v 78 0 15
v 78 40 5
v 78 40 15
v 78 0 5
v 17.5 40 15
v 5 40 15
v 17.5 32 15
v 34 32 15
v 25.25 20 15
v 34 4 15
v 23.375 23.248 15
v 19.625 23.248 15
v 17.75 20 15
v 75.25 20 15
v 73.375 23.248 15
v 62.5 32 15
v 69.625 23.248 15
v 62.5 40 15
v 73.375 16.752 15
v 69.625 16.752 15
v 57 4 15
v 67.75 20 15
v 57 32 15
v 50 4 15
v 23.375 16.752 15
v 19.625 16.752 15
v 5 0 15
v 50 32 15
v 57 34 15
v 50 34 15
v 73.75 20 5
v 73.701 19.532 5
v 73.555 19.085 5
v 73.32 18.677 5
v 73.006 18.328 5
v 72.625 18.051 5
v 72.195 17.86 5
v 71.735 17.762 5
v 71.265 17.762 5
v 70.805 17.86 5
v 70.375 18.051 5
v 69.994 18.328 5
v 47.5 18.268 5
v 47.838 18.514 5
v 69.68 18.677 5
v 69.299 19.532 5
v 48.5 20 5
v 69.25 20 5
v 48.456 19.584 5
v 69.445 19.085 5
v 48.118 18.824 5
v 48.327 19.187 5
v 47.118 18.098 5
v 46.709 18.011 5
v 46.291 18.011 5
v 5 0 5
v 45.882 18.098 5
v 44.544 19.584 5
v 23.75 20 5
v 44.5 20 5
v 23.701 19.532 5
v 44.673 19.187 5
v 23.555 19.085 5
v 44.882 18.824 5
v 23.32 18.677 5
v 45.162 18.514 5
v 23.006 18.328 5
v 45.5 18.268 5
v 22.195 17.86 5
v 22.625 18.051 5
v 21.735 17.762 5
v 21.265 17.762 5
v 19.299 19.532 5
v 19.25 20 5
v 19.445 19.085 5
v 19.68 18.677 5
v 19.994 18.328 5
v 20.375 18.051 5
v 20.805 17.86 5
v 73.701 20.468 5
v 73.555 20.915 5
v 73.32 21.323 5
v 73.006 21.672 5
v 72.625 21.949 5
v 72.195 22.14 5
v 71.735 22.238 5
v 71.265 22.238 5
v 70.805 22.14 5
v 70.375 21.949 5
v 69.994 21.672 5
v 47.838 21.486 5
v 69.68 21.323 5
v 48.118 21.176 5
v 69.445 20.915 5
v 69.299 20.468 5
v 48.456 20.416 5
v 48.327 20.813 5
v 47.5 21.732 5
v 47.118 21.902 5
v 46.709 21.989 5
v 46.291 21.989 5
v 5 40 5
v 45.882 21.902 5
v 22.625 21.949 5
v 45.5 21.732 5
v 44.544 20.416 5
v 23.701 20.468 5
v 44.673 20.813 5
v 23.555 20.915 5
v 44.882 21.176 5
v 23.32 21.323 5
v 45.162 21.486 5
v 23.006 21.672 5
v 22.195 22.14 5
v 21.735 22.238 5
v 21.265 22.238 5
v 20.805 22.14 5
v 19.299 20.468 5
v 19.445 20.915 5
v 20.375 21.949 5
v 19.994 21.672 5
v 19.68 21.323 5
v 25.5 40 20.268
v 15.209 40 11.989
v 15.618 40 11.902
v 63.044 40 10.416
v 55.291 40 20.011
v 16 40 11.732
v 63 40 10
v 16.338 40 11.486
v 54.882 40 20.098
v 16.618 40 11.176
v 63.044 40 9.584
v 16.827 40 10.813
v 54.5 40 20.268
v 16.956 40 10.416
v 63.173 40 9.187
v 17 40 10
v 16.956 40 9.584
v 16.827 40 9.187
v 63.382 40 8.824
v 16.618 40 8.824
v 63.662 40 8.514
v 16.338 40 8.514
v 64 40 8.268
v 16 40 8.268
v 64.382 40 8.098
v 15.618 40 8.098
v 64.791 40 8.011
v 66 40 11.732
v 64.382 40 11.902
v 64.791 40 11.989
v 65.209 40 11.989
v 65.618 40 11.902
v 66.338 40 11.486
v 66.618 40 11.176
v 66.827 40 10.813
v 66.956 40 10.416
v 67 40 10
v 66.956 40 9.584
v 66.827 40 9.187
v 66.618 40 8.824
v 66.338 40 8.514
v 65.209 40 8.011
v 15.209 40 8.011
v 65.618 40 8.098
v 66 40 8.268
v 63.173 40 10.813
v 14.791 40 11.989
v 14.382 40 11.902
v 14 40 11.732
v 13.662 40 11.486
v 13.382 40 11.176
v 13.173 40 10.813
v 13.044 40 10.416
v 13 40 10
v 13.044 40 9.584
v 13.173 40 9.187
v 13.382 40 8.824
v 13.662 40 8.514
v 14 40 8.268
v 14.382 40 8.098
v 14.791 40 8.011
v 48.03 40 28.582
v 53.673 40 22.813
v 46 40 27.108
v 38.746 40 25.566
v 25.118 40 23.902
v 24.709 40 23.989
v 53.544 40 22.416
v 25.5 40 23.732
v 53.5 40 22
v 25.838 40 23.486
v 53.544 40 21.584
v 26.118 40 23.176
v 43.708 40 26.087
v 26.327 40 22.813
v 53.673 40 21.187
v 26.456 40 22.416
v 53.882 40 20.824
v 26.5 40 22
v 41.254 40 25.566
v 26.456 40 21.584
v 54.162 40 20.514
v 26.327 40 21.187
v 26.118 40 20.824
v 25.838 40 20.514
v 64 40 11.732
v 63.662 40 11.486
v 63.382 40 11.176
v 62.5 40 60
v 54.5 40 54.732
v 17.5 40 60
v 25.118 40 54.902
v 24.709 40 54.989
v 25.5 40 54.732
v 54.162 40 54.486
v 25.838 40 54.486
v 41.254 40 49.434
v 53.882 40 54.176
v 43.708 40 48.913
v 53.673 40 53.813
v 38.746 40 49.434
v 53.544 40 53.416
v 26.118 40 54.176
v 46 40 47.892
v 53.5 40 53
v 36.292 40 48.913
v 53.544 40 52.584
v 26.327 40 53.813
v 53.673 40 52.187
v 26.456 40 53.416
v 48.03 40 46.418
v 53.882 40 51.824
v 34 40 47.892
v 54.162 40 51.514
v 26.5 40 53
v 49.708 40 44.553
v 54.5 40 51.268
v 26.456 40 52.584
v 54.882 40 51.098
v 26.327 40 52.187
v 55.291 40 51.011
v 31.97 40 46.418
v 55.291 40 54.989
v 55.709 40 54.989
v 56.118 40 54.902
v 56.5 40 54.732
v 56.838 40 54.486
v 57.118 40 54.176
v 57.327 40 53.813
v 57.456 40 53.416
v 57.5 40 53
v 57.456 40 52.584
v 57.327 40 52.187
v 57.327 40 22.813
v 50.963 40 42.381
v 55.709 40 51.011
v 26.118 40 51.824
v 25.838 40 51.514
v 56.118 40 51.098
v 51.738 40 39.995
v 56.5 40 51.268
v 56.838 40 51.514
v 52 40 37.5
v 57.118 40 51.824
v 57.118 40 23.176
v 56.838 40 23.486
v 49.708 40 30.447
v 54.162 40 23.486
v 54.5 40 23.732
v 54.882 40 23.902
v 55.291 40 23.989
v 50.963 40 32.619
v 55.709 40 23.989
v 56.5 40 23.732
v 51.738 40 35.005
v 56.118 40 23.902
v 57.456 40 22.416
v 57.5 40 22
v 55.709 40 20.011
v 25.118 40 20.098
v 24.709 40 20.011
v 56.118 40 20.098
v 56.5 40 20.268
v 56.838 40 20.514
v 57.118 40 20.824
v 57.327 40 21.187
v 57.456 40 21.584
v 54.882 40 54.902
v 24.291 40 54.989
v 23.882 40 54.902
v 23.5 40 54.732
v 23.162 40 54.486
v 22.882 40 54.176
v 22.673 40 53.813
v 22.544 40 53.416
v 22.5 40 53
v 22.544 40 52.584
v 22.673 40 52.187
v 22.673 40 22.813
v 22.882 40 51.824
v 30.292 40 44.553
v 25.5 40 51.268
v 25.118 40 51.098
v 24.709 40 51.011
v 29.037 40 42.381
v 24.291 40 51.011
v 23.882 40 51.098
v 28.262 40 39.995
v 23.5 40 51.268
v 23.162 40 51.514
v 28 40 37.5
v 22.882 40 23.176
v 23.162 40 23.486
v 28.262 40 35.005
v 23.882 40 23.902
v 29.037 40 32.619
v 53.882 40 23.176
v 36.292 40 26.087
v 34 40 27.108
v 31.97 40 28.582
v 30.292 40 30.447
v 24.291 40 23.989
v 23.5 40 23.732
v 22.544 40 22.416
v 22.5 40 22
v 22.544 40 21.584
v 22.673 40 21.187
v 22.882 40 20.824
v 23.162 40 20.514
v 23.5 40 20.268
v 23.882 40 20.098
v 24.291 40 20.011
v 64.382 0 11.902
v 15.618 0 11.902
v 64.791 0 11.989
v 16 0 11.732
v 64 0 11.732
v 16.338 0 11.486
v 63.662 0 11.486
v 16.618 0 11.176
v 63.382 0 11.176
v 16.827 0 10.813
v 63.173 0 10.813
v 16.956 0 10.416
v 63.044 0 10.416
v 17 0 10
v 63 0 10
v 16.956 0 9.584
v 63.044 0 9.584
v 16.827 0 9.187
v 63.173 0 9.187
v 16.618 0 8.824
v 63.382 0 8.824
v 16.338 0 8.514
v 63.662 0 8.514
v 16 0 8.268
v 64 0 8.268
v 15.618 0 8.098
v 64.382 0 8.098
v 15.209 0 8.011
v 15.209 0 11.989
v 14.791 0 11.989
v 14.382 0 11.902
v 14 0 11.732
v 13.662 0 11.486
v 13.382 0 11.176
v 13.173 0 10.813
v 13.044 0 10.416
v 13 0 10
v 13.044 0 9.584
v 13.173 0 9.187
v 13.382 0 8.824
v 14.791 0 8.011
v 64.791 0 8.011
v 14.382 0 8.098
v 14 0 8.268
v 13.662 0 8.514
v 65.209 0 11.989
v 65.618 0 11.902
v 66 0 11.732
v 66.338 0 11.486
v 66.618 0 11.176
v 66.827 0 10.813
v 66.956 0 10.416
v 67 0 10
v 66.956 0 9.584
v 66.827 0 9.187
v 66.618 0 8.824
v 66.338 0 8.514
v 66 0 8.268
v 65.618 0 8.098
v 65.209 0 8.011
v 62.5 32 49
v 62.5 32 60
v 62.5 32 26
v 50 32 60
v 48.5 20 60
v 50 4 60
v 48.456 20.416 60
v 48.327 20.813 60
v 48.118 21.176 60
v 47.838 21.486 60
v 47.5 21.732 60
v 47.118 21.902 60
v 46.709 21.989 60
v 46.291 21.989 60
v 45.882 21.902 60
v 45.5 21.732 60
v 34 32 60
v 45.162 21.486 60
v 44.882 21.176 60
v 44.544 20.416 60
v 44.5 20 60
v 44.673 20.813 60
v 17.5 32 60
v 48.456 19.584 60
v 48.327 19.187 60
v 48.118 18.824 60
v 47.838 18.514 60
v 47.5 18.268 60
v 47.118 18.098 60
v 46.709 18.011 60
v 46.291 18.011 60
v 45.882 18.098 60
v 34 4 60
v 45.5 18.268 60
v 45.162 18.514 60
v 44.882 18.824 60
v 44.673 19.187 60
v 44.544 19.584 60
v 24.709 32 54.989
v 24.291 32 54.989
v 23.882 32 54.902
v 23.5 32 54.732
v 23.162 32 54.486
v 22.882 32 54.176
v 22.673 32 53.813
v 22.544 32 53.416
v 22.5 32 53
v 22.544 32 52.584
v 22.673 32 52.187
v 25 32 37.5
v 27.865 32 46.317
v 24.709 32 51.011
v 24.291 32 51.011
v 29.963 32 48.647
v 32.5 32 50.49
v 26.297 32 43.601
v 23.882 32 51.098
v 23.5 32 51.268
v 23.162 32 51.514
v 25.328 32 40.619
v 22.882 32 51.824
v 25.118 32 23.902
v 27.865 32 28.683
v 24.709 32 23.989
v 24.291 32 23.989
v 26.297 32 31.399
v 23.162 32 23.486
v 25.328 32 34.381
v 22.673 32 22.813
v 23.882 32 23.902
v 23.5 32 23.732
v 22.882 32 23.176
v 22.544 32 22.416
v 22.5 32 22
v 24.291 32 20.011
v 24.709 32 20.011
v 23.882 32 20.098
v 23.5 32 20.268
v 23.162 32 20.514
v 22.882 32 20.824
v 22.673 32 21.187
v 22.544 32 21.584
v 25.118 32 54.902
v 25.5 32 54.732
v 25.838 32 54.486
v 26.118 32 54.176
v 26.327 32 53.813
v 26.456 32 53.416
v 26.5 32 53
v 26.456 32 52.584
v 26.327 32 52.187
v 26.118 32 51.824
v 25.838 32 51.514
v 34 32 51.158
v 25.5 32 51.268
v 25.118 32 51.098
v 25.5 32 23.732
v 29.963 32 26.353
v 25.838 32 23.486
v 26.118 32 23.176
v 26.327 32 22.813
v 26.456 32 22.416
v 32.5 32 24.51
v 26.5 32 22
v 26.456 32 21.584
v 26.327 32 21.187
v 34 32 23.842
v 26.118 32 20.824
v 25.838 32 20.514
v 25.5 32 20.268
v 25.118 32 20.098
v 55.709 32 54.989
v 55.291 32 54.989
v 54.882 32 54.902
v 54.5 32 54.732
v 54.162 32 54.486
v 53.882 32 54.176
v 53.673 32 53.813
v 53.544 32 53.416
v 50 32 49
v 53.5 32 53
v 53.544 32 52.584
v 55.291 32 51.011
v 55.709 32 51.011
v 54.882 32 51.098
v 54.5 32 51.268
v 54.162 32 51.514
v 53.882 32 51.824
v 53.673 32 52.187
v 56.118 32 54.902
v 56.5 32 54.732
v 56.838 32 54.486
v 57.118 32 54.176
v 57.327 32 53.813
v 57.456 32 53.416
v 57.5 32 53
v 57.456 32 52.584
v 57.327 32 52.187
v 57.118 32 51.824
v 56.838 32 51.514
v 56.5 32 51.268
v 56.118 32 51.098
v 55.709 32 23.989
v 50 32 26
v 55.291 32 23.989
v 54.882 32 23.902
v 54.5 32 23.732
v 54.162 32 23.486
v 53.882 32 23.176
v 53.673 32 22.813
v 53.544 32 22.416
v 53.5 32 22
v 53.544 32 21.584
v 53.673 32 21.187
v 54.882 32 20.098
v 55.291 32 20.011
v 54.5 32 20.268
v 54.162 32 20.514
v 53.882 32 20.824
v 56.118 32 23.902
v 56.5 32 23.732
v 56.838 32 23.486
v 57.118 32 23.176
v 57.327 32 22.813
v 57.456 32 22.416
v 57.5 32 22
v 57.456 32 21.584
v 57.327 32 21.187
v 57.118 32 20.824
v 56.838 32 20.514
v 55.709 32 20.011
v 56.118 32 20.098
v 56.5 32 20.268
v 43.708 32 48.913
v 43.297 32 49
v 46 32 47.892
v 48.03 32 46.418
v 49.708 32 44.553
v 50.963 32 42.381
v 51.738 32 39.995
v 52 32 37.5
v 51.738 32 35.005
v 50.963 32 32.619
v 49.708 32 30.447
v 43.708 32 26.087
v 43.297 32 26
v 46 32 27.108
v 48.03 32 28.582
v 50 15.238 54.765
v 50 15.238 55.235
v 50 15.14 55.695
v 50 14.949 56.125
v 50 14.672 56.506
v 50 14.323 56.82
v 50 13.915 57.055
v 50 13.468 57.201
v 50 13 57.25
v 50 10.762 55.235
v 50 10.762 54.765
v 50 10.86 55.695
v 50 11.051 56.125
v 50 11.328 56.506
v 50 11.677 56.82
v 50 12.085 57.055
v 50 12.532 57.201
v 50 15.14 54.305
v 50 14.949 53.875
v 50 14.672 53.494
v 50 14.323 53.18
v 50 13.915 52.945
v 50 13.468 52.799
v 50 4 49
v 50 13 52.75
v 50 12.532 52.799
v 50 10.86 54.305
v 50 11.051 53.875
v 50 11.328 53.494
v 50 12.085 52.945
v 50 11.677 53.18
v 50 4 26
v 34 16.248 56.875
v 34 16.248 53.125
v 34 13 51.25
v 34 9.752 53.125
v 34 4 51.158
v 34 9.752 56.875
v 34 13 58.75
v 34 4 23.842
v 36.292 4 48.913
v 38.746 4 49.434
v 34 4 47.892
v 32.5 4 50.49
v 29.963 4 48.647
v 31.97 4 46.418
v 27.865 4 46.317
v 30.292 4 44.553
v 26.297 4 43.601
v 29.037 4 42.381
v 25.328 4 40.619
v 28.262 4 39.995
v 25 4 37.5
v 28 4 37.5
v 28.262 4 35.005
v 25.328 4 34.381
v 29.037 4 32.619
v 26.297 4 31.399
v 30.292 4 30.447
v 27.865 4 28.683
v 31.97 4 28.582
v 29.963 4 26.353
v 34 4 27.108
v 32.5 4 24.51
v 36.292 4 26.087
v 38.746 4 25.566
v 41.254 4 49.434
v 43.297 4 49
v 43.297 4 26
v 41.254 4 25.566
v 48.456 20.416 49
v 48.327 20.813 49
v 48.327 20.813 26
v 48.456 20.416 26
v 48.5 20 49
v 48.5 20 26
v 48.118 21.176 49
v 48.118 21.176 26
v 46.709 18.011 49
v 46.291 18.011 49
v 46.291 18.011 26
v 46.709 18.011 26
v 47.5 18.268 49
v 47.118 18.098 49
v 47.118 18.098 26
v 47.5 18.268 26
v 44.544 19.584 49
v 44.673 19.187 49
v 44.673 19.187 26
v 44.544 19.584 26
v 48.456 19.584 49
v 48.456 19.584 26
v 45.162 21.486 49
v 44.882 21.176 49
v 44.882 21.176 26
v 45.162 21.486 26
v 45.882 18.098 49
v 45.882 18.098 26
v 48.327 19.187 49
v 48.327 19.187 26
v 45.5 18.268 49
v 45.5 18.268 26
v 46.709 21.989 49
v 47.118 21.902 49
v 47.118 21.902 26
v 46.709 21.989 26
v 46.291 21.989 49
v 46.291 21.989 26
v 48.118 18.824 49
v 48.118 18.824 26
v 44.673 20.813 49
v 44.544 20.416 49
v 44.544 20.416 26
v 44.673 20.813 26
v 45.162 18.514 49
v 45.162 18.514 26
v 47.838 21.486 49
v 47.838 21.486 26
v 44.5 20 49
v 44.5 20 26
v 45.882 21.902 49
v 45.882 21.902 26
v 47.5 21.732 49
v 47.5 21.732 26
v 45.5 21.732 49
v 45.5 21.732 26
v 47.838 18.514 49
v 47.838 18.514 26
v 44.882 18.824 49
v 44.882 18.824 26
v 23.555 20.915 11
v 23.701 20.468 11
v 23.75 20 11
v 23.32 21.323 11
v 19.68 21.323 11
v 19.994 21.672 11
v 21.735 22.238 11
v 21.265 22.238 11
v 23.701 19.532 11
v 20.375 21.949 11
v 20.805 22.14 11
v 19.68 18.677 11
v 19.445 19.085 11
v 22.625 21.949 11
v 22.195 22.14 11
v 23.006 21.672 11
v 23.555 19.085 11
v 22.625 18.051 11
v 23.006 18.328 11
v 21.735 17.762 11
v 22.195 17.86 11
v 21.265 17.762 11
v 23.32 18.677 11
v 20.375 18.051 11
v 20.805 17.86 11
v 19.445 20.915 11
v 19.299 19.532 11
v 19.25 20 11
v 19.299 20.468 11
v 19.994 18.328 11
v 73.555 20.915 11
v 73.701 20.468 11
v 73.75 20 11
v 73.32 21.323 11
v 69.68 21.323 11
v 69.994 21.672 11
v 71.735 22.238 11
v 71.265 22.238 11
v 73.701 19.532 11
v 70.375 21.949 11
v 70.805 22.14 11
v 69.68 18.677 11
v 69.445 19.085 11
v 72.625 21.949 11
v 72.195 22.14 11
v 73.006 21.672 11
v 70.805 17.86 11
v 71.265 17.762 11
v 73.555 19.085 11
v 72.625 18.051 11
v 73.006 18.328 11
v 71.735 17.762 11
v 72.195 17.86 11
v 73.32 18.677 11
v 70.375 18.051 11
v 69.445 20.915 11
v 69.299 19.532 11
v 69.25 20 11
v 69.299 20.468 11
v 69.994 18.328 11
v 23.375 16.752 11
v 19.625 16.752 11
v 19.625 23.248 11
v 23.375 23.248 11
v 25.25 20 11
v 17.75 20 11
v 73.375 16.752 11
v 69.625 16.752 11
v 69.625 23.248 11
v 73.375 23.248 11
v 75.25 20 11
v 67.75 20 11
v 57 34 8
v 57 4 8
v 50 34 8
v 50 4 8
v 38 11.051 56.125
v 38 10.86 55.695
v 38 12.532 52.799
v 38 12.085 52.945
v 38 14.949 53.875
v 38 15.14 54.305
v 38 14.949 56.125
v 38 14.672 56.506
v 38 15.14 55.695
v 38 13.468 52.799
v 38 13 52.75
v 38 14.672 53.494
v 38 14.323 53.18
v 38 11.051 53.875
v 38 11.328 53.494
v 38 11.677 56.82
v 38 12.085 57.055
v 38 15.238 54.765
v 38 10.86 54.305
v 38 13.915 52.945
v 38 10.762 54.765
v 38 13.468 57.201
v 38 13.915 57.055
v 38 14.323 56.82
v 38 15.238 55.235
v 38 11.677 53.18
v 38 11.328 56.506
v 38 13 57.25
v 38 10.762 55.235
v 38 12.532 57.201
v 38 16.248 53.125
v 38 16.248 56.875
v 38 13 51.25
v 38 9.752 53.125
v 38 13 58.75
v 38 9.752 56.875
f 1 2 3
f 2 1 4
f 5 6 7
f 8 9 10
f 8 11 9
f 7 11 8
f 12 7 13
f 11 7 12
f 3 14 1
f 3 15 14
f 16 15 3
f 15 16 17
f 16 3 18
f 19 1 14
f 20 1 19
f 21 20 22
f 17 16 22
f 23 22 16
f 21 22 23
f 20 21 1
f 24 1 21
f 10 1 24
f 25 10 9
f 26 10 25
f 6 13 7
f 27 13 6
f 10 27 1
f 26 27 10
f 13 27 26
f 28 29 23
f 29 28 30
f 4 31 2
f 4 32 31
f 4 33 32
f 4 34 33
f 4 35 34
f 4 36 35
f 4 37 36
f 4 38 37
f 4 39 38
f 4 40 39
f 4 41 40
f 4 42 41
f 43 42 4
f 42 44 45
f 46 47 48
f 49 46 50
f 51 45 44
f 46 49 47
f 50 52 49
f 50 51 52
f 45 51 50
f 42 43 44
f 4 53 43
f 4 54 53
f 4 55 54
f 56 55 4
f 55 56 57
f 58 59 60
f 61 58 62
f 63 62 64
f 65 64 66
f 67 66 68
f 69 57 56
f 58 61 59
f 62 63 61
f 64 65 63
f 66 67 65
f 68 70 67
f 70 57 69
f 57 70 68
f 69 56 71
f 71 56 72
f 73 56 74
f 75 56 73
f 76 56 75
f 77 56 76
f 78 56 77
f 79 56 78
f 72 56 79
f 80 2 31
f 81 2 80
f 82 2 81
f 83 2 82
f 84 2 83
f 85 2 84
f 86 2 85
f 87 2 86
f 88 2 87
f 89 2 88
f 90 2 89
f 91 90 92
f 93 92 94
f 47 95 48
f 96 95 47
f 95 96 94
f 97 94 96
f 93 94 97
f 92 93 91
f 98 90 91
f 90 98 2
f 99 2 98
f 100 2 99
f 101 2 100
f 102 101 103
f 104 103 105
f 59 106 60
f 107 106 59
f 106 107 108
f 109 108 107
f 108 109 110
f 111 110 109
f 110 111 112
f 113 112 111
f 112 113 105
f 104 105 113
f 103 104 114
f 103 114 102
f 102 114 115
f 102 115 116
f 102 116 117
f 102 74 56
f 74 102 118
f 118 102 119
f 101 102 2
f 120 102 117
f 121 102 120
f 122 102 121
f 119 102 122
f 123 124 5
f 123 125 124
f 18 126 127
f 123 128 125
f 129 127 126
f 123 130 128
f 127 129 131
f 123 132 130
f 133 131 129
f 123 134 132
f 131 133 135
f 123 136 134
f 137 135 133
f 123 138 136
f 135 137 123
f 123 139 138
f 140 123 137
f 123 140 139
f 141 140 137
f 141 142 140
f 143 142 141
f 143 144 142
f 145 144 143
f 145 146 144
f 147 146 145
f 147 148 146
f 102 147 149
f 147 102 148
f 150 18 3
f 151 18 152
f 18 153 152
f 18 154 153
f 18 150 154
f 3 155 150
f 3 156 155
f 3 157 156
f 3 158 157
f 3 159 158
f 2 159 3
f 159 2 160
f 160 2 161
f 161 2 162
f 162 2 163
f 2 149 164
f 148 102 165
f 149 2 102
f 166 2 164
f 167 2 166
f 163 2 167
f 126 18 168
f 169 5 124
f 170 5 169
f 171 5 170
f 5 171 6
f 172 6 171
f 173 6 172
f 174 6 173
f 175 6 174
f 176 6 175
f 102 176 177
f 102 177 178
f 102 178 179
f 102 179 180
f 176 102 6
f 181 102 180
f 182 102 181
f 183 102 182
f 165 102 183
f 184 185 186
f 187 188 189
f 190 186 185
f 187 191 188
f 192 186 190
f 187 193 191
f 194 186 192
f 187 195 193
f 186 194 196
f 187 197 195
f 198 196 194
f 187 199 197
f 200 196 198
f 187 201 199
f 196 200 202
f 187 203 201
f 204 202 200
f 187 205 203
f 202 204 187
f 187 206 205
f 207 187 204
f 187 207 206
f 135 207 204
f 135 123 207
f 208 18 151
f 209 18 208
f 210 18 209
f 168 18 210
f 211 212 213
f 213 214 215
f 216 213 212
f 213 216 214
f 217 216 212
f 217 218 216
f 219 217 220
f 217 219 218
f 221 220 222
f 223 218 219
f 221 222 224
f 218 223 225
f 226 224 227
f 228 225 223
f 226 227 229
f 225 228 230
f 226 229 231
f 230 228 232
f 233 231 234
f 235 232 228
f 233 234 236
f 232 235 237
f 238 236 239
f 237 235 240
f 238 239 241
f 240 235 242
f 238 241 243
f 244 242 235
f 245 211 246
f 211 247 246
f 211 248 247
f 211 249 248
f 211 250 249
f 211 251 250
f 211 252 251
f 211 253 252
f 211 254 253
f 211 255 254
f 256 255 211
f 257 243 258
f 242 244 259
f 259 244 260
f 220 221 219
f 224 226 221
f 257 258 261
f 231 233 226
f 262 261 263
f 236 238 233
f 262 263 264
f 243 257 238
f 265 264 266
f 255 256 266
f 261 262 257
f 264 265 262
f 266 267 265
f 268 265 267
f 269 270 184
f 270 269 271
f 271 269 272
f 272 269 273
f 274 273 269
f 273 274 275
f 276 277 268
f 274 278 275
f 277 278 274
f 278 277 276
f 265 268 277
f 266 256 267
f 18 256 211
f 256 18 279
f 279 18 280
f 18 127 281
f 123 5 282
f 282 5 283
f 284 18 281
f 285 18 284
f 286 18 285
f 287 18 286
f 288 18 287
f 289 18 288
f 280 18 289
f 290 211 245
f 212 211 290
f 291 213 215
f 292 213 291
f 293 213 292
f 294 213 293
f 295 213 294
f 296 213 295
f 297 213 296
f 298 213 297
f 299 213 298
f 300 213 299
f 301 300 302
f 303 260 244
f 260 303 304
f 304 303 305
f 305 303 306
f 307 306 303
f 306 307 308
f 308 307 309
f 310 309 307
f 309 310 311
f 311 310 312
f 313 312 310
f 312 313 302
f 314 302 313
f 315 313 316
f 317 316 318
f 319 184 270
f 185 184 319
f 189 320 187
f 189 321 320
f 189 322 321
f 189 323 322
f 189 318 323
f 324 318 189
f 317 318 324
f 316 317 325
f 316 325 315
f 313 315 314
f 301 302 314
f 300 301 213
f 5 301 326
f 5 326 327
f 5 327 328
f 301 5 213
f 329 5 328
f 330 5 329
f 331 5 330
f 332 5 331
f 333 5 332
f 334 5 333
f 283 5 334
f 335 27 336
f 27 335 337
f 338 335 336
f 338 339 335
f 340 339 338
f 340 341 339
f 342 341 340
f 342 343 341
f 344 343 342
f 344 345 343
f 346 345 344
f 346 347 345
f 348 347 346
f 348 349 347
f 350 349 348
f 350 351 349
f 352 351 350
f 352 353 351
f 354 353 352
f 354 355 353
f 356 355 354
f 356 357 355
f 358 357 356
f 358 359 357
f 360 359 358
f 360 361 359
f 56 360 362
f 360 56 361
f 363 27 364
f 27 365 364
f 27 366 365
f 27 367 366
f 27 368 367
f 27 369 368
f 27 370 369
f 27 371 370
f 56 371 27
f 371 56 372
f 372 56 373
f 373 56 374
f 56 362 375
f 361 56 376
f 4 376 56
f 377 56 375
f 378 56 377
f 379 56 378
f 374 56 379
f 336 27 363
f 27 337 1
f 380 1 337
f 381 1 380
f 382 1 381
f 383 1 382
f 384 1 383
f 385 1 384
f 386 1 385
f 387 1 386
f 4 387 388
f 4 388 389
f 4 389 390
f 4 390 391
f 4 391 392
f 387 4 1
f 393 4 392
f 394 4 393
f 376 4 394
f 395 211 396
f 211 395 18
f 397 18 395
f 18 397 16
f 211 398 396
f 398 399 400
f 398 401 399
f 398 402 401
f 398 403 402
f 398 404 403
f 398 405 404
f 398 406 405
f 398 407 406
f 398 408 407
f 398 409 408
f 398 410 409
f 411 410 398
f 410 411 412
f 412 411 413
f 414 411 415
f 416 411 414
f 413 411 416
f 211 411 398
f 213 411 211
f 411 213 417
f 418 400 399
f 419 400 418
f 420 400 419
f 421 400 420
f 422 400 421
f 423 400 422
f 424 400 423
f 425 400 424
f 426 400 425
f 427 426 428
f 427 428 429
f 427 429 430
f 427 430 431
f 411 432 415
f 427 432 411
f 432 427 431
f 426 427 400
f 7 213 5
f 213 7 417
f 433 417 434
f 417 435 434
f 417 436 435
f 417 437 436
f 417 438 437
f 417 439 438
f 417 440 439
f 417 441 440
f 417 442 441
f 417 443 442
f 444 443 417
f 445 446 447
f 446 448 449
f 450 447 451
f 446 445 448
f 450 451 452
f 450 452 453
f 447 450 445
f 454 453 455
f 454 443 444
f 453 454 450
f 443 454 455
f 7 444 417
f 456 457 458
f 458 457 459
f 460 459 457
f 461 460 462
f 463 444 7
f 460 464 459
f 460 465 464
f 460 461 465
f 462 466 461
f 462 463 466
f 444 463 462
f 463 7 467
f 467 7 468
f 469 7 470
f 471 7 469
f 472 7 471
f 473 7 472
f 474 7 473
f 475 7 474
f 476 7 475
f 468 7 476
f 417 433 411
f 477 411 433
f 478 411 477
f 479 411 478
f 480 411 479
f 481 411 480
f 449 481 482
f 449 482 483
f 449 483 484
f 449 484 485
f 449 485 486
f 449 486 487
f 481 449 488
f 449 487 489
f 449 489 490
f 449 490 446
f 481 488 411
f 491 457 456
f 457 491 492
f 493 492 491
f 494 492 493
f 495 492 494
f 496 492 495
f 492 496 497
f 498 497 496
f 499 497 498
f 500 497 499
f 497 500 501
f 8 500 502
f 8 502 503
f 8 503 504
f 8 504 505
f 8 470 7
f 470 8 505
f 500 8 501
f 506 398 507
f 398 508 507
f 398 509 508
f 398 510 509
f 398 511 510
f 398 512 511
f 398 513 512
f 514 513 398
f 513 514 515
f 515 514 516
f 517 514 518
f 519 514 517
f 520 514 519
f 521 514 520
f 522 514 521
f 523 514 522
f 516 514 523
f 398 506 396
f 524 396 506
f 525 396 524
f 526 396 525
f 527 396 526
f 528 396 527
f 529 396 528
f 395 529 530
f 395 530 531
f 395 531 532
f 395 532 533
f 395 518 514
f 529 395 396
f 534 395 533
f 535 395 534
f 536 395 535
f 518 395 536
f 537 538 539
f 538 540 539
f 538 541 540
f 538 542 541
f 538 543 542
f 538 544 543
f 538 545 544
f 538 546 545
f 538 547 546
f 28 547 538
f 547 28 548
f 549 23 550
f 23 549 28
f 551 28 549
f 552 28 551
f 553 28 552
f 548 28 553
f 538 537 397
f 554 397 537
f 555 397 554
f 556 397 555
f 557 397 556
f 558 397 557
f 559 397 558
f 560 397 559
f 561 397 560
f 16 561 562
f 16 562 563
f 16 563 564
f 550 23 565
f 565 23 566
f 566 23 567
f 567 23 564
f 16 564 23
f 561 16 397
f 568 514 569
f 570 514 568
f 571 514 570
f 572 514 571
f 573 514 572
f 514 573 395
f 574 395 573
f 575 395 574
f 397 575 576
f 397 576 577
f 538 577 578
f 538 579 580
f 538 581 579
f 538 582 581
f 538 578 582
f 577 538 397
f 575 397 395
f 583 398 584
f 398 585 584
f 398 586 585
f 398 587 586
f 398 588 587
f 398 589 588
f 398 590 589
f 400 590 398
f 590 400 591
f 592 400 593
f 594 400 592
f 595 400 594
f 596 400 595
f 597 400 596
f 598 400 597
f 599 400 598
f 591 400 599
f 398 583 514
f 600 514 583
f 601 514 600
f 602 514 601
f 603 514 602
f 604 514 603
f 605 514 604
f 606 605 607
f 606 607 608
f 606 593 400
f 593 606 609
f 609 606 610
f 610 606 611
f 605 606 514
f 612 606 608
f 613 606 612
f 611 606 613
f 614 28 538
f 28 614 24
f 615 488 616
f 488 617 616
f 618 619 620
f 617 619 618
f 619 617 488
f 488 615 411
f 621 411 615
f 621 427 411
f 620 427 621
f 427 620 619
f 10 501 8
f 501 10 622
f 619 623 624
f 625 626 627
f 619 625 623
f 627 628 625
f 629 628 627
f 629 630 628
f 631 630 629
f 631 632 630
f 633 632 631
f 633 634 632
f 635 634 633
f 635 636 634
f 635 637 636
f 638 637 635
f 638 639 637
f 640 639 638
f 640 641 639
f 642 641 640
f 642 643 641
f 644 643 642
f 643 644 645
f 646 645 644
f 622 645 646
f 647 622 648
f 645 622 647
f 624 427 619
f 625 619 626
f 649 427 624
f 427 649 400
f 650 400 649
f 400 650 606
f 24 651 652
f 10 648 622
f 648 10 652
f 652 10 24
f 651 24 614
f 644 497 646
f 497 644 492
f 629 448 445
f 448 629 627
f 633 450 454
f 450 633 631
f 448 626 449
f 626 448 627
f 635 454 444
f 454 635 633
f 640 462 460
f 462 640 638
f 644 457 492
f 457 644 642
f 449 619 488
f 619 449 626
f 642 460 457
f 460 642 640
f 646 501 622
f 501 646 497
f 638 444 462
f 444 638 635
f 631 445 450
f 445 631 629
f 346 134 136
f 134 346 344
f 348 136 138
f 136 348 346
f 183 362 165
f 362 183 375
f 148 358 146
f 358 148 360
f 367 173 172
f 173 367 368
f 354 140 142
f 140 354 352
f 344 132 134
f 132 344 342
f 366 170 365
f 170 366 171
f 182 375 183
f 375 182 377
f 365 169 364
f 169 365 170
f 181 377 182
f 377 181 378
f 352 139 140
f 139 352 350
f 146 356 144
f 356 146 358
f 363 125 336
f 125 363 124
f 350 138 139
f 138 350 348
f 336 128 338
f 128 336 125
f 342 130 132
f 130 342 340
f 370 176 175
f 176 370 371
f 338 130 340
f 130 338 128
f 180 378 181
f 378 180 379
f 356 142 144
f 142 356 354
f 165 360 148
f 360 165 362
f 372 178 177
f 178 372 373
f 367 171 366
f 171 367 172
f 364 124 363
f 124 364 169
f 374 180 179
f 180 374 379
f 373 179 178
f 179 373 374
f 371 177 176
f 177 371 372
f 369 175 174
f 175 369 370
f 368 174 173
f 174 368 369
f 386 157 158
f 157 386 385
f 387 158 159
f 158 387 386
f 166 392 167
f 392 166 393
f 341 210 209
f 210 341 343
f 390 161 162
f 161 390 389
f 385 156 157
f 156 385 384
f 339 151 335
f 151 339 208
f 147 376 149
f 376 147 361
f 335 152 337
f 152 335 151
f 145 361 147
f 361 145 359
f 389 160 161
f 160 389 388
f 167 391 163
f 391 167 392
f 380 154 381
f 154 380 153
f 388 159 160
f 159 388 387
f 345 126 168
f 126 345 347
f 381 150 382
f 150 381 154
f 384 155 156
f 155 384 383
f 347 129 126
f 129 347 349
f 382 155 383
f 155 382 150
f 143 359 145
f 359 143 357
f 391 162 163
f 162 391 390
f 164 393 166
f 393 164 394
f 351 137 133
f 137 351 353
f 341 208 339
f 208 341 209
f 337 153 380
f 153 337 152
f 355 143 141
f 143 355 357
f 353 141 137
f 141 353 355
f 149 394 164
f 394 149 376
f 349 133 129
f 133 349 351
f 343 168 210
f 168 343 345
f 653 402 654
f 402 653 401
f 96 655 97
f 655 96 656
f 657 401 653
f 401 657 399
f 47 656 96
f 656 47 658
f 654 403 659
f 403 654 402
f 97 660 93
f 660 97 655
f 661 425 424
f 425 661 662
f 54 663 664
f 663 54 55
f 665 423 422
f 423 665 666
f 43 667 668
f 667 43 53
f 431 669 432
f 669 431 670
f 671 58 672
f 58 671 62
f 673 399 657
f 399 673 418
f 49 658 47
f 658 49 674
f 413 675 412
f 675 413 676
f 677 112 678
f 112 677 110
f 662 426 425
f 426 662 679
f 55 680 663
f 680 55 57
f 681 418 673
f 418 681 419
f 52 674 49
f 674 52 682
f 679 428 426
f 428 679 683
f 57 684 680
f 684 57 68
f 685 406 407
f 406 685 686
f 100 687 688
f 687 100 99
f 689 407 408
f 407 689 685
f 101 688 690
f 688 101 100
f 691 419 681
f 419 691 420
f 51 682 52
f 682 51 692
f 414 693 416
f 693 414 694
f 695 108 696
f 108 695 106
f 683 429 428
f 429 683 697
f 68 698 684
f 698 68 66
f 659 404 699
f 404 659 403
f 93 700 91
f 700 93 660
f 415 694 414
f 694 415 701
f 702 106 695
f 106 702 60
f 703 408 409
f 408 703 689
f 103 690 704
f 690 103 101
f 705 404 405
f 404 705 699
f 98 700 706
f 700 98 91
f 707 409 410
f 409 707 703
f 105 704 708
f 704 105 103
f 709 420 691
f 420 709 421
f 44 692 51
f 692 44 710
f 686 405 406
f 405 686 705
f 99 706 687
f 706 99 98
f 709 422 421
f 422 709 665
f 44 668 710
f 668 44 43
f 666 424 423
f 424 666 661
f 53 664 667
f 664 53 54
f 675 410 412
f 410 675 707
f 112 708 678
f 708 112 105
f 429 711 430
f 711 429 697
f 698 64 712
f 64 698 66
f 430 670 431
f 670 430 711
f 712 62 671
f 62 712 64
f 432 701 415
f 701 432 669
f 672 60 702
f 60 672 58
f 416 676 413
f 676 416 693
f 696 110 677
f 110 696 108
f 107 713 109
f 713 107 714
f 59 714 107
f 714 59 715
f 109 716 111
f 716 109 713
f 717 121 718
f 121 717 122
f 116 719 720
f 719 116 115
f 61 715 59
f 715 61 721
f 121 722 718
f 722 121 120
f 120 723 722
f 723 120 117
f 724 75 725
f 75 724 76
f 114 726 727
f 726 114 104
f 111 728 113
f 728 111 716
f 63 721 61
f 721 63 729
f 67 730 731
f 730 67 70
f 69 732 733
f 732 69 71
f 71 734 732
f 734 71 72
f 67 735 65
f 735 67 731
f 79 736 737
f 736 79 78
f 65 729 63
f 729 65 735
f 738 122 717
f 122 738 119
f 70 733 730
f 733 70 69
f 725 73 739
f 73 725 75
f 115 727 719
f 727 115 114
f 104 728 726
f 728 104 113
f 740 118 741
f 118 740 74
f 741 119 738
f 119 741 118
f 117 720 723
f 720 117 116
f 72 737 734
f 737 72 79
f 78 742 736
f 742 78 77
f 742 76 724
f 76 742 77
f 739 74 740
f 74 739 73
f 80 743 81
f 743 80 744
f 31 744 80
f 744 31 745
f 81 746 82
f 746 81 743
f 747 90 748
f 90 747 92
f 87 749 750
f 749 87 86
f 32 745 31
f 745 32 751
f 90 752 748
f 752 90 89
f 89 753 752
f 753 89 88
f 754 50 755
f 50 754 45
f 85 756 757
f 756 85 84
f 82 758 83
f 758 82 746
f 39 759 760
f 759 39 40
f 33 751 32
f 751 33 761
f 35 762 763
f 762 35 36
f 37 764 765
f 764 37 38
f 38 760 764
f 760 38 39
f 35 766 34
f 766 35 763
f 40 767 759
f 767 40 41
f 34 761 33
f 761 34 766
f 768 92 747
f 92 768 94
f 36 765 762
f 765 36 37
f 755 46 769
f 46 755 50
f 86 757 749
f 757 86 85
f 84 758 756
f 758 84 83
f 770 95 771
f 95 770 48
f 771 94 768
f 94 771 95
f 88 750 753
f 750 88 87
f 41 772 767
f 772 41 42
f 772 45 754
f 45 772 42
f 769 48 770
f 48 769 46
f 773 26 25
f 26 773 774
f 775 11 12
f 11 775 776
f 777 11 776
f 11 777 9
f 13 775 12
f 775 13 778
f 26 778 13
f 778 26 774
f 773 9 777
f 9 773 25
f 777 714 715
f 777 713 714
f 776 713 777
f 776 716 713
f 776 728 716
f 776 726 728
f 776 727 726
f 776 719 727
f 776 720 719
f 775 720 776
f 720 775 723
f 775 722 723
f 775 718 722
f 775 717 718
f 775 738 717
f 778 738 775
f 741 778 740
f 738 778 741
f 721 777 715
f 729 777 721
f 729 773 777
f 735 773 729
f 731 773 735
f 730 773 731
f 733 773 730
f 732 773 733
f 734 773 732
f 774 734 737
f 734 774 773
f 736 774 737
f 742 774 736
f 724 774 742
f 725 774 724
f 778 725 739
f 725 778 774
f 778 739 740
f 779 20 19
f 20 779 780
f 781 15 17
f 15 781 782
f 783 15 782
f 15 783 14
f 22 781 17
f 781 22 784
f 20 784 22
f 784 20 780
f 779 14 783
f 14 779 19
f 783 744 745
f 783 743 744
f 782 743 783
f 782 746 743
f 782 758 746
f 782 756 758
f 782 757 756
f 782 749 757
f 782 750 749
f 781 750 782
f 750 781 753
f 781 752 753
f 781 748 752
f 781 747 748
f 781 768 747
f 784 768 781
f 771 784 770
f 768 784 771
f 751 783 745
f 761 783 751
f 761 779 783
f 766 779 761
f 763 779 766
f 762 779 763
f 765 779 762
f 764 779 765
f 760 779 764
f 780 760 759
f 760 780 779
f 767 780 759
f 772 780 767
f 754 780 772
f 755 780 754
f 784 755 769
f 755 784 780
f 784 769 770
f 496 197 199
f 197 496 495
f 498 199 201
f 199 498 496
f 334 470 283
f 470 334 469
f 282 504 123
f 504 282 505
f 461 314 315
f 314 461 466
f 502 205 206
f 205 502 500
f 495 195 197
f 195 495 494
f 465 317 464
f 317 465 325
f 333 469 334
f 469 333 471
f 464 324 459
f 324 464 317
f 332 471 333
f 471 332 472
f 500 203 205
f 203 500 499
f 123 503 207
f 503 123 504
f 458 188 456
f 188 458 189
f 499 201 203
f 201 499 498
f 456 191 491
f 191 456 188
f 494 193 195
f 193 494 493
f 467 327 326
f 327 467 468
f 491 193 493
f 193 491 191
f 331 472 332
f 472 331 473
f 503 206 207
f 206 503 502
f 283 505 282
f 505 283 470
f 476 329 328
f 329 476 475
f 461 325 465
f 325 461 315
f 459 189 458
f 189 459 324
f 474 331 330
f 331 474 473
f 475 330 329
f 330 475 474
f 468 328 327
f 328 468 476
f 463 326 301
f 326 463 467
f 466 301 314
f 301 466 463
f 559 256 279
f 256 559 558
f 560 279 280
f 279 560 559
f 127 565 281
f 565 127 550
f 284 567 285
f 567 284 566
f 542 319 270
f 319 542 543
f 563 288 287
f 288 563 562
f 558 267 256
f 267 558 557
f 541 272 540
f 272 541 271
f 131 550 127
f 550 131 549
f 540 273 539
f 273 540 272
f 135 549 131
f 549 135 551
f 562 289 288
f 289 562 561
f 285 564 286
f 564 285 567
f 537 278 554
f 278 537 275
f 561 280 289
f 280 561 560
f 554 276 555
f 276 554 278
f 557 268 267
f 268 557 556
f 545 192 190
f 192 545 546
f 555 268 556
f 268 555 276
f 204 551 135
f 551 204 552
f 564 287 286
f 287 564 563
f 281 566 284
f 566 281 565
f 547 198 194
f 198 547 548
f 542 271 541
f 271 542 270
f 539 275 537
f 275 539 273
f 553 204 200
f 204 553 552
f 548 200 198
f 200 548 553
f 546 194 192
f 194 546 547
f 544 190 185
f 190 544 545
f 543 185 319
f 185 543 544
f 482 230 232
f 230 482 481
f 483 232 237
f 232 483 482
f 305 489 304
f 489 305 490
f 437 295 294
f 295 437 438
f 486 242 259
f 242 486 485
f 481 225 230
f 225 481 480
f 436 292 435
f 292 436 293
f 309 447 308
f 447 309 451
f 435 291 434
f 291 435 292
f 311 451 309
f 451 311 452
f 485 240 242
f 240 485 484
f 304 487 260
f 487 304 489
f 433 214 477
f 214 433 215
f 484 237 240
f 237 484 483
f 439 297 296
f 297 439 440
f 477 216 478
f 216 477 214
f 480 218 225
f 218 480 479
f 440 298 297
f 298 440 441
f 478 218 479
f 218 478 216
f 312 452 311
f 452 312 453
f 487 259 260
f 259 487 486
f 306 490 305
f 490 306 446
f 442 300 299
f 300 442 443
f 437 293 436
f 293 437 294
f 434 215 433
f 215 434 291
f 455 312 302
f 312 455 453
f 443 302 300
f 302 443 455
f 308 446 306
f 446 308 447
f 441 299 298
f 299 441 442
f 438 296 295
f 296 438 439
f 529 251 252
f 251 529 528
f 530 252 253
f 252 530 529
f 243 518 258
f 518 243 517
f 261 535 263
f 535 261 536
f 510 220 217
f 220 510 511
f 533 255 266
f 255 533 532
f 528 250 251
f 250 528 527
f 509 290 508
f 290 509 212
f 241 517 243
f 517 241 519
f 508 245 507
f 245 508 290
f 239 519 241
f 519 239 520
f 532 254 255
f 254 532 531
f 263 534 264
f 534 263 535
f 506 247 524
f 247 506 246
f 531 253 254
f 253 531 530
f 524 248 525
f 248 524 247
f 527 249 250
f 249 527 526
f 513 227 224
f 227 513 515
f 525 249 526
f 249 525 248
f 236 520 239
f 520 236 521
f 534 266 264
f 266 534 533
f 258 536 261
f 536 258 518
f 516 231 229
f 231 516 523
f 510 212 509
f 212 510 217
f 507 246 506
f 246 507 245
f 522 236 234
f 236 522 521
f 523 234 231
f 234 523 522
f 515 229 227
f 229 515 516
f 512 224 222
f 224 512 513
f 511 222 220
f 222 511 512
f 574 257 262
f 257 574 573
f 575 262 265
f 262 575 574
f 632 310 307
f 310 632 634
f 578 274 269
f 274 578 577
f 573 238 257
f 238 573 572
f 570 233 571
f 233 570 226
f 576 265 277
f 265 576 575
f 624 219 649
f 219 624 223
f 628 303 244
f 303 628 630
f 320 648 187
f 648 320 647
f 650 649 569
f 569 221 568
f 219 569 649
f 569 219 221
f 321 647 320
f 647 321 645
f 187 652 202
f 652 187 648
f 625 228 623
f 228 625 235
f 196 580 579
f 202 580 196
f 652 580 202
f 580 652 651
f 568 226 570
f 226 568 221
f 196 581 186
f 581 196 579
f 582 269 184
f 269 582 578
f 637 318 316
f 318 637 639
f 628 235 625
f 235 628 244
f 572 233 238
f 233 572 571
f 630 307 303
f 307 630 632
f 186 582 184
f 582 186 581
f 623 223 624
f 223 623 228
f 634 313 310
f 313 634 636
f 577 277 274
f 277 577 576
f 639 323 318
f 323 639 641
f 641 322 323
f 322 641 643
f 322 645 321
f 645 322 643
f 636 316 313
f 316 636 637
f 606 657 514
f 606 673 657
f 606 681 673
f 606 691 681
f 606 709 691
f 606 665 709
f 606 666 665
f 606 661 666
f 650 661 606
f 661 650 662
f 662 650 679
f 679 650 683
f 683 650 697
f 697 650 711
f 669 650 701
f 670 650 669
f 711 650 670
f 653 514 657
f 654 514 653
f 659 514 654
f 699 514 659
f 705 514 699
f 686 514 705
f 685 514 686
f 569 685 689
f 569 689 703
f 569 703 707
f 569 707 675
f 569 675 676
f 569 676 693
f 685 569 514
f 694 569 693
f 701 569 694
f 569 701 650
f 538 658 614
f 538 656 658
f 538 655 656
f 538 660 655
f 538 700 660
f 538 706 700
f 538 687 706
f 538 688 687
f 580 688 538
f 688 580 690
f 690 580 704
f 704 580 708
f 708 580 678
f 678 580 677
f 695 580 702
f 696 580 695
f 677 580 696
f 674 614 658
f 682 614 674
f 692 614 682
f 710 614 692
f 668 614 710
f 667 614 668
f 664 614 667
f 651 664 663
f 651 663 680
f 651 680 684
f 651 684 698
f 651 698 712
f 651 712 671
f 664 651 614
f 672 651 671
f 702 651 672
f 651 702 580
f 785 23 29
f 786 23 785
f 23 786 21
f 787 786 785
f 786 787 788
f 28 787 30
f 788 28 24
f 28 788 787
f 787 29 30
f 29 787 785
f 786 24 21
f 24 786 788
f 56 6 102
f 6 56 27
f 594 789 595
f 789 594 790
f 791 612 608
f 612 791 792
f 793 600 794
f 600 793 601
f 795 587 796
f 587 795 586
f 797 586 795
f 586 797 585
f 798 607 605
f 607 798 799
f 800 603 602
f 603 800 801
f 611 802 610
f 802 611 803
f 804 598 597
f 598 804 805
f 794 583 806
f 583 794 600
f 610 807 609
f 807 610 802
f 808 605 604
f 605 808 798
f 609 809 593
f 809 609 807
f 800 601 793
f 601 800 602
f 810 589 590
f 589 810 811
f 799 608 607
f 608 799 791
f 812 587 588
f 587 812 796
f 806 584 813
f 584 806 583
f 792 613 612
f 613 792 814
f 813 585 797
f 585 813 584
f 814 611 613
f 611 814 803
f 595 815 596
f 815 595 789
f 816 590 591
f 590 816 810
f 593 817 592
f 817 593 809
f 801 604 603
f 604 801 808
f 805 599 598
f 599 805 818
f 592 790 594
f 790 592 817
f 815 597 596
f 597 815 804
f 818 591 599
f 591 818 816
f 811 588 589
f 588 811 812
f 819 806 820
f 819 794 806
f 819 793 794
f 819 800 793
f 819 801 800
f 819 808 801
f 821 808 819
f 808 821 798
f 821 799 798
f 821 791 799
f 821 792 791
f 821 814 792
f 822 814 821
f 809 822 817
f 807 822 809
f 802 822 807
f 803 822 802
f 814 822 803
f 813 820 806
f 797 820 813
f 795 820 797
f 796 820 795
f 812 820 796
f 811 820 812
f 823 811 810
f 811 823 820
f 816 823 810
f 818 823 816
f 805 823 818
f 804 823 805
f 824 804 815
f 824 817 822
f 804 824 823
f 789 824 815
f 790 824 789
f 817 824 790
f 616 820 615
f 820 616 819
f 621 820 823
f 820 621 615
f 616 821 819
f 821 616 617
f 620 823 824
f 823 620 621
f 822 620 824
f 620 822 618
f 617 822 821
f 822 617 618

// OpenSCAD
//$fn=360;
$fn=30;
module base(){
  difference(){
    // Blocks
    union(){
      // Base
      translate([0,0,5])cube([78,40,10]);
      // Motor mount
      translate([17.5,32,15]) cube([45,8,45]);
      // Filament guide
      translate([34,4,15]) cube([16,28,45]);
      translate([40,18,37.5]) rotate([90,0,0]) cylinder(r=15, h=28, center=true);
    }

    // Holes
    union(){
      // Carriage set screws
      translate([15,0,7.5+5/2]) rotate([90,0,0]) cylinder(r=2, h=100, center=true);
      translate([65,0,7.5+5/2]) rotate([90,0,0]) cylinder(r=2, h=100, center=true);
      // Filament
      translate([46.5,20,40]) cylinder(r=2, h=100, center=true);
      // Nozzle set bolts
      translate([21.5,20,7.5]) cylinder(r=4.5/2, h=50, center=true);
      translate([71.5,20,7.5]) cylinder(r=4.5/2, h=50, center=true);
      // Nozzle nut sockets
      translate([21.5,20,16]) cylinder(r=7.5/2, h=10, center=true,$fn=6);
      translate([71.5,20,16]) cylinder(r=7.5/2, h=10, center=true,$fn=6);
      // Motor bolts
      translate([24.5,40,22]) rotate([90,0,0]) cylinder(r=2, h=100, center=true);
      translate([55.5,40,22]) rotate([90,0,0]) cylinder(r=2, h=100, center=true);
      translate([24.5,40,53]) rotate([90,0,0]) cylinder(r=2, h=100, center=true);
      translate([55.5,40,53]) rotate([90,0,0]) cylinder(r=2, h=100, center=true);
      // Motor shaft
      translate([40,40,37.5]) rotate([90,0,0]) cylinder(r=12, h=100, center=true);
      // Idler input hole
      translate([40,0,26]) cube([50,32,23]);
      // Idler groove
      translate([50,4,8]) cube([7,30,7]);
      // Width excess
      cube([5,45,20]);
      // Tighten bolt
      translate([50,13,55]) rotate([0,90,0]) cylinder(r=4.5/2, h=50, center=true);
      // Tighten bolt nut hole
      translate([33,13,55]) rotate([0,90,0]) cylinder(r=7.5/2, h=10, center=true,$fn=6);
    }
  }
}

module idler(){
  // Idler
  difference(){
    union(){
      // Footer
      translate([51,5,8]) cube([5,26,52]);
      // Bearing mount
      translate([56,5,17]) cube([10,26,43]);
    }
    union(){
      // Bearing socket
      translate([50,15.5,25]) cube([40,9,25]);
      // Bearing axis
      translate([56,40,37.5]) rotate([90,0,0]) cylinder(r=7.6/2, h=100, center=true);
      translate([48.4,2,33.7]) cube([7.6,30,7.6]);
      // Tighten bolt
      translate([50,13,55]) rotate([0,90,0]) cylinder(r=2.5, h=1000, center=true);
    }
  }
}

base();
//idler();
